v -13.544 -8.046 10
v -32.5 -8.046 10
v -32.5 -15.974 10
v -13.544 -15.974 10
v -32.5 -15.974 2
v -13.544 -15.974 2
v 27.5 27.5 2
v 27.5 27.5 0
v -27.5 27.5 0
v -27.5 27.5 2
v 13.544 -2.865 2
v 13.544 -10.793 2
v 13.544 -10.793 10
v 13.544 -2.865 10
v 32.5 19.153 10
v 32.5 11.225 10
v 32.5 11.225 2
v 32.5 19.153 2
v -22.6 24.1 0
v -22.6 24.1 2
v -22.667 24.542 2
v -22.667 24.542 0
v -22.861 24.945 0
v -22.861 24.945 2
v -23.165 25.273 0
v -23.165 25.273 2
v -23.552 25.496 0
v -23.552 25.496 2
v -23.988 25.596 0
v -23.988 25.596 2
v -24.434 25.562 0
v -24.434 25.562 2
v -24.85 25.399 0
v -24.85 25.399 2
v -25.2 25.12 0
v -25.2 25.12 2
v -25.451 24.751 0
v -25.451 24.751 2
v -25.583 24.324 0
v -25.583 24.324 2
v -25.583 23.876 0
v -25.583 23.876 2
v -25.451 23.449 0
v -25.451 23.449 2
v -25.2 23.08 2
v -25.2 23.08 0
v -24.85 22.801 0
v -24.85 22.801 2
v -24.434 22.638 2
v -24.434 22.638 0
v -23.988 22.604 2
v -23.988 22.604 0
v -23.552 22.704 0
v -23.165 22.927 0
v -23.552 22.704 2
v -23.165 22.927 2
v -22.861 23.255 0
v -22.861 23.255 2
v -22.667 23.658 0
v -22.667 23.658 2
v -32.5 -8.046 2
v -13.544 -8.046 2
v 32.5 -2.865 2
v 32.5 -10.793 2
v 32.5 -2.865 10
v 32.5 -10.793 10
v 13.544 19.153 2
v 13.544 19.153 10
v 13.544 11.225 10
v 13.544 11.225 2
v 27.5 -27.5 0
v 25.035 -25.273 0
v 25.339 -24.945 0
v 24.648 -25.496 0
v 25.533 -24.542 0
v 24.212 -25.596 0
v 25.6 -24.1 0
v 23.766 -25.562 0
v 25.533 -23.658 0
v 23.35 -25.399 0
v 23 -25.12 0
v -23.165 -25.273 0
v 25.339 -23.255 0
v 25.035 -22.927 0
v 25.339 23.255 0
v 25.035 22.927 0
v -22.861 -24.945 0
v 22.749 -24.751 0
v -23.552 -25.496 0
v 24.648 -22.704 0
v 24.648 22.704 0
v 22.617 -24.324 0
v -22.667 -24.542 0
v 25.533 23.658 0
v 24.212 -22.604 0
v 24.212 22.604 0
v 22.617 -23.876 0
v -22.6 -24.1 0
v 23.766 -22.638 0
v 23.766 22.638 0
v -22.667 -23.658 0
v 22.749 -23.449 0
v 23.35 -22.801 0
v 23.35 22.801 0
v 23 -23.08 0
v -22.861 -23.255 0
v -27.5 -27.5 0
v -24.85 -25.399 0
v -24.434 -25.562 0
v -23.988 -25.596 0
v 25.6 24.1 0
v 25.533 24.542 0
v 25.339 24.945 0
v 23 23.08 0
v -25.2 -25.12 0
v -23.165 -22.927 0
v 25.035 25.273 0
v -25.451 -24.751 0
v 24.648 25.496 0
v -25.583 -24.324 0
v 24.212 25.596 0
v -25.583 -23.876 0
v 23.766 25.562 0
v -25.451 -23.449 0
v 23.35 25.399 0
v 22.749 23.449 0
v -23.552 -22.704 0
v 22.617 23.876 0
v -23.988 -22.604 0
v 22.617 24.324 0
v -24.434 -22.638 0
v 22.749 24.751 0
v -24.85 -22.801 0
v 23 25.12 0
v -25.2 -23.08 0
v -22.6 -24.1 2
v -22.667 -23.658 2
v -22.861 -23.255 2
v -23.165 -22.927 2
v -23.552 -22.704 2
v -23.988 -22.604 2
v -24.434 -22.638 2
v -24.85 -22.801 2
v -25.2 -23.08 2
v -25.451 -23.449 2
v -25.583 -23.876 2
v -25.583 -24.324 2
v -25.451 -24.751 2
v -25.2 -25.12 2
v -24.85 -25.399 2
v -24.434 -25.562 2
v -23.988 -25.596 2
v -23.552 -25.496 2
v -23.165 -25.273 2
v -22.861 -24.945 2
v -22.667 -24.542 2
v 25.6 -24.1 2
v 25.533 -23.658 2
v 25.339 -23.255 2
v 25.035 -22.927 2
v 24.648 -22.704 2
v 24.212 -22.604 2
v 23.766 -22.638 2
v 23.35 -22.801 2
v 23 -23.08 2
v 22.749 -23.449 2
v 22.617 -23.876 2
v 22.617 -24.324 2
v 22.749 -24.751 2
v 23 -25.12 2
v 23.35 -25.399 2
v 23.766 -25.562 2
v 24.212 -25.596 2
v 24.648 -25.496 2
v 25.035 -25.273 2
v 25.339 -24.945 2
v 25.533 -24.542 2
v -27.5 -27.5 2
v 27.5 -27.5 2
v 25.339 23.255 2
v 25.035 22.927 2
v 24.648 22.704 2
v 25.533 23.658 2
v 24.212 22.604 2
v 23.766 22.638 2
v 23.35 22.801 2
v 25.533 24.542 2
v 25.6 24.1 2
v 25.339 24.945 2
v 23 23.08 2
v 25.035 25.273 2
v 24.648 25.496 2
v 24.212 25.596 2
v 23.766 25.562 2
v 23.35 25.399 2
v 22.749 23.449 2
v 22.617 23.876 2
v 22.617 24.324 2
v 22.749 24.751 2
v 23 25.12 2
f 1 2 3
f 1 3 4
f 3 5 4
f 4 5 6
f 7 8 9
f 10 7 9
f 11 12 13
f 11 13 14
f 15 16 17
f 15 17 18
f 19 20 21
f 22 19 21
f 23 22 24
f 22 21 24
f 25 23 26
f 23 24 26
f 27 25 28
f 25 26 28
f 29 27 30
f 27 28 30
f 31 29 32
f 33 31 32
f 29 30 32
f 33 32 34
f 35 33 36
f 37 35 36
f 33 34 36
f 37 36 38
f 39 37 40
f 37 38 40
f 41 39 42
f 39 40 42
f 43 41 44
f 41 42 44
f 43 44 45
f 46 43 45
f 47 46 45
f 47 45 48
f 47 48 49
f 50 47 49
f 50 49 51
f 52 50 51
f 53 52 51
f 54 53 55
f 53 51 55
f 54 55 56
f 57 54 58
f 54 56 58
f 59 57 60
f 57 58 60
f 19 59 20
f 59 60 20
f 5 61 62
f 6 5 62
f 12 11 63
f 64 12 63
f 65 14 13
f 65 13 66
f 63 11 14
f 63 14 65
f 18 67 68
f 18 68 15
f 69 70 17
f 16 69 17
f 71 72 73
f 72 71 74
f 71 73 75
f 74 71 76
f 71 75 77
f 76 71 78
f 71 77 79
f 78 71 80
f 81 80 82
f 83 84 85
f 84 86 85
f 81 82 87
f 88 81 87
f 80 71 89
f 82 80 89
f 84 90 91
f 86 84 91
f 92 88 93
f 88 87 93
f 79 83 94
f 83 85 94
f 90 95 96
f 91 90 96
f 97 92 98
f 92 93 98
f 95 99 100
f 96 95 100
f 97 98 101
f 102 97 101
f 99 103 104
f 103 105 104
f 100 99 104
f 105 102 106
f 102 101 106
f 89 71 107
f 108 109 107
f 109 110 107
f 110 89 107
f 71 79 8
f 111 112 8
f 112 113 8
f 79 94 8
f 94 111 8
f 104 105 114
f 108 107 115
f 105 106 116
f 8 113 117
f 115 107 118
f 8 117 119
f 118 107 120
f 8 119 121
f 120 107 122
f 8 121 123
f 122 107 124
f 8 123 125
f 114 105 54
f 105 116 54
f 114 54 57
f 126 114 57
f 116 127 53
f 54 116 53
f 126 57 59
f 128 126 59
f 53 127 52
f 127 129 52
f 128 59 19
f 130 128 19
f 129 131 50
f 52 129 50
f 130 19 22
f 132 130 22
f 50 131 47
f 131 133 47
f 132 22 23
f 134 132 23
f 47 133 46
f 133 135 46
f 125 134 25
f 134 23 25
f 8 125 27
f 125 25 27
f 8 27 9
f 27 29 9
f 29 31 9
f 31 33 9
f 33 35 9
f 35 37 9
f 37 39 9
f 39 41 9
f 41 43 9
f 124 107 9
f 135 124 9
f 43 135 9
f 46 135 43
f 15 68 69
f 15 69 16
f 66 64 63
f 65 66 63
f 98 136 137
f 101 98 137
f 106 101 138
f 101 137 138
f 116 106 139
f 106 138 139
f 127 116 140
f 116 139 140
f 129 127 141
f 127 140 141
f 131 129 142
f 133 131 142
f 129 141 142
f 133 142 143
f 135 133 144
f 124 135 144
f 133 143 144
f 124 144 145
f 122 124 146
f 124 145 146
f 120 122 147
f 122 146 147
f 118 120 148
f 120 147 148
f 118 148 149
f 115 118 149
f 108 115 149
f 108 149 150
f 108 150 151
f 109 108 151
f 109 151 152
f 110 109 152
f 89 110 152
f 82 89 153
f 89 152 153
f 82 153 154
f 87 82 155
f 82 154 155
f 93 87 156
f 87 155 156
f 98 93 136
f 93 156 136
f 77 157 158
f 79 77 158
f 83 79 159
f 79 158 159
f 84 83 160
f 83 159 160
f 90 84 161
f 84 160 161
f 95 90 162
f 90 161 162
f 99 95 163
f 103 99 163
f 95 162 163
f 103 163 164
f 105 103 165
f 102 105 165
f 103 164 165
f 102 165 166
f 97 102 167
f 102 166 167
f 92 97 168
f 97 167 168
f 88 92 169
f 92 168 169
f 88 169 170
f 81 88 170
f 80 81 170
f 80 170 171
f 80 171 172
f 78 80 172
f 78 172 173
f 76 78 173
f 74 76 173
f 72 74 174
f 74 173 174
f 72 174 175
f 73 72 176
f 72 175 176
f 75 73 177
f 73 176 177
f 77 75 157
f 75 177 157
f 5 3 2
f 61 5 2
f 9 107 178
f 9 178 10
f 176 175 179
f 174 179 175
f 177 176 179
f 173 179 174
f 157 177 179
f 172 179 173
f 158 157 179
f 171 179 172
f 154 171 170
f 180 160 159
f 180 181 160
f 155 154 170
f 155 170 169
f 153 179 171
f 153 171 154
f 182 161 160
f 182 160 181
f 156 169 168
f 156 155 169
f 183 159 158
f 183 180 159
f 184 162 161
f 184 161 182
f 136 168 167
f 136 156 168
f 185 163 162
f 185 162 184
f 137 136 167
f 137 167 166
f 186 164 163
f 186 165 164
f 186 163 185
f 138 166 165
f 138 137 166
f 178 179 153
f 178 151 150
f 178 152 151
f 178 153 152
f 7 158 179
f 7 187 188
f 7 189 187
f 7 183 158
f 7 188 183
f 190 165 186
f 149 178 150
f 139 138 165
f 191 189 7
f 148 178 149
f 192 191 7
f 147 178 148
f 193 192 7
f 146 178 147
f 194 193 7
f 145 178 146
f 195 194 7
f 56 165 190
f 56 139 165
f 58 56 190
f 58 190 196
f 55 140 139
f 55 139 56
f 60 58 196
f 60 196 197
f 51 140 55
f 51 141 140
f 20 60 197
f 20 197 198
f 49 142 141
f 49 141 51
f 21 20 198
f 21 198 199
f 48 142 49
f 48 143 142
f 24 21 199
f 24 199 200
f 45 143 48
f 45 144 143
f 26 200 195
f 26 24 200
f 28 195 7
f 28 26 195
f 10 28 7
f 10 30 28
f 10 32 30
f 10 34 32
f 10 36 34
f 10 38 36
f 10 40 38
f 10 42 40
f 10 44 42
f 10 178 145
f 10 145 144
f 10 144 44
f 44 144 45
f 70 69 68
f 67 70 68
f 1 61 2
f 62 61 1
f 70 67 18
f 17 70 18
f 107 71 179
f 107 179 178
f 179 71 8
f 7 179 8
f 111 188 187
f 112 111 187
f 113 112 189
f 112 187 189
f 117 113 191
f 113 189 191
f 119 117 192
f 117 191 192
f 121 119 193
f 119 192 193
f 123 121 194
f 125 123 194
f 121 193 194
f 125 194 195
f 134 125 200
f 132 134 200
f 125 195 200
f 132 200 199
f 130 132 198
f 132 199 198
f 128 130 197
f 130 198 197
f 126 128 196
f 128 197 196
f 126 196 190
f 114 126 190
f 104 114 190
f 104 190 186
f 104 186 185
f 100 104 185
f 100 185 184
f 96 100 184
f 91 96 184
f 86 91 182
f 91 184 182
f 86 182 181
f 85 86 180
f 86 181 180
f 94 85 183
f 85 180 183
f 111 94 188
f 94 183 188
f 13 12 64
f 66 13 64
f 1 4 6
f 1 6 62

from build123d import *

# Parameters (mm, degrees)
SKIZZE1_W                         = 55
SKIZZE1_H                         = 55
AUFSATZ_LINEAR_AUSTRAGEN1_DEPTH   = 2
SKIZZE2_R                         = 1.5
SCHNITT_LINEAR_AUSTRAGEN1_DEPTH   = 2
SKIZZE3_W                         = 18.956359153
SKIZZE3_H                         = 7.92791832
AUFSATZ_LINEAR_AUSTRAGEN2_DEPTH   = 8
SKIZZE3_H_2                       = 7.927918321
AUFSATZ_LINEAR_AUSTRAGEN2_2_DEPTH = 8
AUFSATZ_LINEAR_AUSTRAGEN2_3_DEPTH = 8


with BuildPart() as part:
    # Skizze1 → Aufsatz-Linear austragen1 (new body)
    with BuildSketch(Plane(origin=(0, 0, 0), x_dir=(0, 1, 0), z_dir=(0, 0, 1))):
        Rectangle(SKIZZE1_W, SKIZZE1_H)
    extrude(amount=AUFSATZ_LINEAR_AUSTRAGEN1_DEPTH)

    # Skizze2 → Schnitt-Linear austragen1 (cut)
    with BuildSketch(Plane.XY.offset(2)):
        with Locations((24.1, 24.1)):
            Circle(SKIZZE2_R)
        with Locations((24.1, -24.1)):
            Circle(SKIZZE2_R)
        with Locations((-24.1, -24.1)):
            Circle(SKIZZE2_R)
        with Locations((-24.1, 24.1)):
            Circle(SKIZZE2_R)
    extrude(amount=-SCHNITT_LINEAR_AUSTRAGEN1_DEPTH, mode=Mode.SUBTRACT)


with BuildPart() as body_2:
    # Skizze3 → Aufsatz-Linear austragen2 (new body)
    with BuildSketch(Plane.XY.offset(2)):
        with Locations((-23.021820423, -12.009618842)):
            Rectangle(SKIZZE3_W, SKIZZE3_H)
    extrude(amount=AUFSATZ_LINEAR_AUSTRAGEN2_DEPTH)


with BuildPart() as body_3:
    # Skizze3 → Aufsatz-Linear austragen2 2 (new body)
    with BuildSketch(Plane.XY.offset(2)):
        with Locations((23.021820423, 15.188635595)):
            Rectangle(SKIZZE3_W, SKIZZE3_H_2)
    extrude(amount=AUFSATZ_LINEAR_AUSTRAGEN2_2_DEPTH)


with BuildPart() as body_4:
    # Skizze3 → Aufsatz-Linear austragen2 3 (new body)
    with BuildSketch(Plane.XY.offset(2)):
        with Locations((23.021820423, -6.82899895)):
            Rectangle(SKIZZE3_W, SKIZZE3_H_2)
    extrude(amount=AUFSATZ_LINEAR_AUSTRAGEN2_3_DEPTH)


solid = Compound([part.part, body_2.part, body_3.part, body_4.part])
